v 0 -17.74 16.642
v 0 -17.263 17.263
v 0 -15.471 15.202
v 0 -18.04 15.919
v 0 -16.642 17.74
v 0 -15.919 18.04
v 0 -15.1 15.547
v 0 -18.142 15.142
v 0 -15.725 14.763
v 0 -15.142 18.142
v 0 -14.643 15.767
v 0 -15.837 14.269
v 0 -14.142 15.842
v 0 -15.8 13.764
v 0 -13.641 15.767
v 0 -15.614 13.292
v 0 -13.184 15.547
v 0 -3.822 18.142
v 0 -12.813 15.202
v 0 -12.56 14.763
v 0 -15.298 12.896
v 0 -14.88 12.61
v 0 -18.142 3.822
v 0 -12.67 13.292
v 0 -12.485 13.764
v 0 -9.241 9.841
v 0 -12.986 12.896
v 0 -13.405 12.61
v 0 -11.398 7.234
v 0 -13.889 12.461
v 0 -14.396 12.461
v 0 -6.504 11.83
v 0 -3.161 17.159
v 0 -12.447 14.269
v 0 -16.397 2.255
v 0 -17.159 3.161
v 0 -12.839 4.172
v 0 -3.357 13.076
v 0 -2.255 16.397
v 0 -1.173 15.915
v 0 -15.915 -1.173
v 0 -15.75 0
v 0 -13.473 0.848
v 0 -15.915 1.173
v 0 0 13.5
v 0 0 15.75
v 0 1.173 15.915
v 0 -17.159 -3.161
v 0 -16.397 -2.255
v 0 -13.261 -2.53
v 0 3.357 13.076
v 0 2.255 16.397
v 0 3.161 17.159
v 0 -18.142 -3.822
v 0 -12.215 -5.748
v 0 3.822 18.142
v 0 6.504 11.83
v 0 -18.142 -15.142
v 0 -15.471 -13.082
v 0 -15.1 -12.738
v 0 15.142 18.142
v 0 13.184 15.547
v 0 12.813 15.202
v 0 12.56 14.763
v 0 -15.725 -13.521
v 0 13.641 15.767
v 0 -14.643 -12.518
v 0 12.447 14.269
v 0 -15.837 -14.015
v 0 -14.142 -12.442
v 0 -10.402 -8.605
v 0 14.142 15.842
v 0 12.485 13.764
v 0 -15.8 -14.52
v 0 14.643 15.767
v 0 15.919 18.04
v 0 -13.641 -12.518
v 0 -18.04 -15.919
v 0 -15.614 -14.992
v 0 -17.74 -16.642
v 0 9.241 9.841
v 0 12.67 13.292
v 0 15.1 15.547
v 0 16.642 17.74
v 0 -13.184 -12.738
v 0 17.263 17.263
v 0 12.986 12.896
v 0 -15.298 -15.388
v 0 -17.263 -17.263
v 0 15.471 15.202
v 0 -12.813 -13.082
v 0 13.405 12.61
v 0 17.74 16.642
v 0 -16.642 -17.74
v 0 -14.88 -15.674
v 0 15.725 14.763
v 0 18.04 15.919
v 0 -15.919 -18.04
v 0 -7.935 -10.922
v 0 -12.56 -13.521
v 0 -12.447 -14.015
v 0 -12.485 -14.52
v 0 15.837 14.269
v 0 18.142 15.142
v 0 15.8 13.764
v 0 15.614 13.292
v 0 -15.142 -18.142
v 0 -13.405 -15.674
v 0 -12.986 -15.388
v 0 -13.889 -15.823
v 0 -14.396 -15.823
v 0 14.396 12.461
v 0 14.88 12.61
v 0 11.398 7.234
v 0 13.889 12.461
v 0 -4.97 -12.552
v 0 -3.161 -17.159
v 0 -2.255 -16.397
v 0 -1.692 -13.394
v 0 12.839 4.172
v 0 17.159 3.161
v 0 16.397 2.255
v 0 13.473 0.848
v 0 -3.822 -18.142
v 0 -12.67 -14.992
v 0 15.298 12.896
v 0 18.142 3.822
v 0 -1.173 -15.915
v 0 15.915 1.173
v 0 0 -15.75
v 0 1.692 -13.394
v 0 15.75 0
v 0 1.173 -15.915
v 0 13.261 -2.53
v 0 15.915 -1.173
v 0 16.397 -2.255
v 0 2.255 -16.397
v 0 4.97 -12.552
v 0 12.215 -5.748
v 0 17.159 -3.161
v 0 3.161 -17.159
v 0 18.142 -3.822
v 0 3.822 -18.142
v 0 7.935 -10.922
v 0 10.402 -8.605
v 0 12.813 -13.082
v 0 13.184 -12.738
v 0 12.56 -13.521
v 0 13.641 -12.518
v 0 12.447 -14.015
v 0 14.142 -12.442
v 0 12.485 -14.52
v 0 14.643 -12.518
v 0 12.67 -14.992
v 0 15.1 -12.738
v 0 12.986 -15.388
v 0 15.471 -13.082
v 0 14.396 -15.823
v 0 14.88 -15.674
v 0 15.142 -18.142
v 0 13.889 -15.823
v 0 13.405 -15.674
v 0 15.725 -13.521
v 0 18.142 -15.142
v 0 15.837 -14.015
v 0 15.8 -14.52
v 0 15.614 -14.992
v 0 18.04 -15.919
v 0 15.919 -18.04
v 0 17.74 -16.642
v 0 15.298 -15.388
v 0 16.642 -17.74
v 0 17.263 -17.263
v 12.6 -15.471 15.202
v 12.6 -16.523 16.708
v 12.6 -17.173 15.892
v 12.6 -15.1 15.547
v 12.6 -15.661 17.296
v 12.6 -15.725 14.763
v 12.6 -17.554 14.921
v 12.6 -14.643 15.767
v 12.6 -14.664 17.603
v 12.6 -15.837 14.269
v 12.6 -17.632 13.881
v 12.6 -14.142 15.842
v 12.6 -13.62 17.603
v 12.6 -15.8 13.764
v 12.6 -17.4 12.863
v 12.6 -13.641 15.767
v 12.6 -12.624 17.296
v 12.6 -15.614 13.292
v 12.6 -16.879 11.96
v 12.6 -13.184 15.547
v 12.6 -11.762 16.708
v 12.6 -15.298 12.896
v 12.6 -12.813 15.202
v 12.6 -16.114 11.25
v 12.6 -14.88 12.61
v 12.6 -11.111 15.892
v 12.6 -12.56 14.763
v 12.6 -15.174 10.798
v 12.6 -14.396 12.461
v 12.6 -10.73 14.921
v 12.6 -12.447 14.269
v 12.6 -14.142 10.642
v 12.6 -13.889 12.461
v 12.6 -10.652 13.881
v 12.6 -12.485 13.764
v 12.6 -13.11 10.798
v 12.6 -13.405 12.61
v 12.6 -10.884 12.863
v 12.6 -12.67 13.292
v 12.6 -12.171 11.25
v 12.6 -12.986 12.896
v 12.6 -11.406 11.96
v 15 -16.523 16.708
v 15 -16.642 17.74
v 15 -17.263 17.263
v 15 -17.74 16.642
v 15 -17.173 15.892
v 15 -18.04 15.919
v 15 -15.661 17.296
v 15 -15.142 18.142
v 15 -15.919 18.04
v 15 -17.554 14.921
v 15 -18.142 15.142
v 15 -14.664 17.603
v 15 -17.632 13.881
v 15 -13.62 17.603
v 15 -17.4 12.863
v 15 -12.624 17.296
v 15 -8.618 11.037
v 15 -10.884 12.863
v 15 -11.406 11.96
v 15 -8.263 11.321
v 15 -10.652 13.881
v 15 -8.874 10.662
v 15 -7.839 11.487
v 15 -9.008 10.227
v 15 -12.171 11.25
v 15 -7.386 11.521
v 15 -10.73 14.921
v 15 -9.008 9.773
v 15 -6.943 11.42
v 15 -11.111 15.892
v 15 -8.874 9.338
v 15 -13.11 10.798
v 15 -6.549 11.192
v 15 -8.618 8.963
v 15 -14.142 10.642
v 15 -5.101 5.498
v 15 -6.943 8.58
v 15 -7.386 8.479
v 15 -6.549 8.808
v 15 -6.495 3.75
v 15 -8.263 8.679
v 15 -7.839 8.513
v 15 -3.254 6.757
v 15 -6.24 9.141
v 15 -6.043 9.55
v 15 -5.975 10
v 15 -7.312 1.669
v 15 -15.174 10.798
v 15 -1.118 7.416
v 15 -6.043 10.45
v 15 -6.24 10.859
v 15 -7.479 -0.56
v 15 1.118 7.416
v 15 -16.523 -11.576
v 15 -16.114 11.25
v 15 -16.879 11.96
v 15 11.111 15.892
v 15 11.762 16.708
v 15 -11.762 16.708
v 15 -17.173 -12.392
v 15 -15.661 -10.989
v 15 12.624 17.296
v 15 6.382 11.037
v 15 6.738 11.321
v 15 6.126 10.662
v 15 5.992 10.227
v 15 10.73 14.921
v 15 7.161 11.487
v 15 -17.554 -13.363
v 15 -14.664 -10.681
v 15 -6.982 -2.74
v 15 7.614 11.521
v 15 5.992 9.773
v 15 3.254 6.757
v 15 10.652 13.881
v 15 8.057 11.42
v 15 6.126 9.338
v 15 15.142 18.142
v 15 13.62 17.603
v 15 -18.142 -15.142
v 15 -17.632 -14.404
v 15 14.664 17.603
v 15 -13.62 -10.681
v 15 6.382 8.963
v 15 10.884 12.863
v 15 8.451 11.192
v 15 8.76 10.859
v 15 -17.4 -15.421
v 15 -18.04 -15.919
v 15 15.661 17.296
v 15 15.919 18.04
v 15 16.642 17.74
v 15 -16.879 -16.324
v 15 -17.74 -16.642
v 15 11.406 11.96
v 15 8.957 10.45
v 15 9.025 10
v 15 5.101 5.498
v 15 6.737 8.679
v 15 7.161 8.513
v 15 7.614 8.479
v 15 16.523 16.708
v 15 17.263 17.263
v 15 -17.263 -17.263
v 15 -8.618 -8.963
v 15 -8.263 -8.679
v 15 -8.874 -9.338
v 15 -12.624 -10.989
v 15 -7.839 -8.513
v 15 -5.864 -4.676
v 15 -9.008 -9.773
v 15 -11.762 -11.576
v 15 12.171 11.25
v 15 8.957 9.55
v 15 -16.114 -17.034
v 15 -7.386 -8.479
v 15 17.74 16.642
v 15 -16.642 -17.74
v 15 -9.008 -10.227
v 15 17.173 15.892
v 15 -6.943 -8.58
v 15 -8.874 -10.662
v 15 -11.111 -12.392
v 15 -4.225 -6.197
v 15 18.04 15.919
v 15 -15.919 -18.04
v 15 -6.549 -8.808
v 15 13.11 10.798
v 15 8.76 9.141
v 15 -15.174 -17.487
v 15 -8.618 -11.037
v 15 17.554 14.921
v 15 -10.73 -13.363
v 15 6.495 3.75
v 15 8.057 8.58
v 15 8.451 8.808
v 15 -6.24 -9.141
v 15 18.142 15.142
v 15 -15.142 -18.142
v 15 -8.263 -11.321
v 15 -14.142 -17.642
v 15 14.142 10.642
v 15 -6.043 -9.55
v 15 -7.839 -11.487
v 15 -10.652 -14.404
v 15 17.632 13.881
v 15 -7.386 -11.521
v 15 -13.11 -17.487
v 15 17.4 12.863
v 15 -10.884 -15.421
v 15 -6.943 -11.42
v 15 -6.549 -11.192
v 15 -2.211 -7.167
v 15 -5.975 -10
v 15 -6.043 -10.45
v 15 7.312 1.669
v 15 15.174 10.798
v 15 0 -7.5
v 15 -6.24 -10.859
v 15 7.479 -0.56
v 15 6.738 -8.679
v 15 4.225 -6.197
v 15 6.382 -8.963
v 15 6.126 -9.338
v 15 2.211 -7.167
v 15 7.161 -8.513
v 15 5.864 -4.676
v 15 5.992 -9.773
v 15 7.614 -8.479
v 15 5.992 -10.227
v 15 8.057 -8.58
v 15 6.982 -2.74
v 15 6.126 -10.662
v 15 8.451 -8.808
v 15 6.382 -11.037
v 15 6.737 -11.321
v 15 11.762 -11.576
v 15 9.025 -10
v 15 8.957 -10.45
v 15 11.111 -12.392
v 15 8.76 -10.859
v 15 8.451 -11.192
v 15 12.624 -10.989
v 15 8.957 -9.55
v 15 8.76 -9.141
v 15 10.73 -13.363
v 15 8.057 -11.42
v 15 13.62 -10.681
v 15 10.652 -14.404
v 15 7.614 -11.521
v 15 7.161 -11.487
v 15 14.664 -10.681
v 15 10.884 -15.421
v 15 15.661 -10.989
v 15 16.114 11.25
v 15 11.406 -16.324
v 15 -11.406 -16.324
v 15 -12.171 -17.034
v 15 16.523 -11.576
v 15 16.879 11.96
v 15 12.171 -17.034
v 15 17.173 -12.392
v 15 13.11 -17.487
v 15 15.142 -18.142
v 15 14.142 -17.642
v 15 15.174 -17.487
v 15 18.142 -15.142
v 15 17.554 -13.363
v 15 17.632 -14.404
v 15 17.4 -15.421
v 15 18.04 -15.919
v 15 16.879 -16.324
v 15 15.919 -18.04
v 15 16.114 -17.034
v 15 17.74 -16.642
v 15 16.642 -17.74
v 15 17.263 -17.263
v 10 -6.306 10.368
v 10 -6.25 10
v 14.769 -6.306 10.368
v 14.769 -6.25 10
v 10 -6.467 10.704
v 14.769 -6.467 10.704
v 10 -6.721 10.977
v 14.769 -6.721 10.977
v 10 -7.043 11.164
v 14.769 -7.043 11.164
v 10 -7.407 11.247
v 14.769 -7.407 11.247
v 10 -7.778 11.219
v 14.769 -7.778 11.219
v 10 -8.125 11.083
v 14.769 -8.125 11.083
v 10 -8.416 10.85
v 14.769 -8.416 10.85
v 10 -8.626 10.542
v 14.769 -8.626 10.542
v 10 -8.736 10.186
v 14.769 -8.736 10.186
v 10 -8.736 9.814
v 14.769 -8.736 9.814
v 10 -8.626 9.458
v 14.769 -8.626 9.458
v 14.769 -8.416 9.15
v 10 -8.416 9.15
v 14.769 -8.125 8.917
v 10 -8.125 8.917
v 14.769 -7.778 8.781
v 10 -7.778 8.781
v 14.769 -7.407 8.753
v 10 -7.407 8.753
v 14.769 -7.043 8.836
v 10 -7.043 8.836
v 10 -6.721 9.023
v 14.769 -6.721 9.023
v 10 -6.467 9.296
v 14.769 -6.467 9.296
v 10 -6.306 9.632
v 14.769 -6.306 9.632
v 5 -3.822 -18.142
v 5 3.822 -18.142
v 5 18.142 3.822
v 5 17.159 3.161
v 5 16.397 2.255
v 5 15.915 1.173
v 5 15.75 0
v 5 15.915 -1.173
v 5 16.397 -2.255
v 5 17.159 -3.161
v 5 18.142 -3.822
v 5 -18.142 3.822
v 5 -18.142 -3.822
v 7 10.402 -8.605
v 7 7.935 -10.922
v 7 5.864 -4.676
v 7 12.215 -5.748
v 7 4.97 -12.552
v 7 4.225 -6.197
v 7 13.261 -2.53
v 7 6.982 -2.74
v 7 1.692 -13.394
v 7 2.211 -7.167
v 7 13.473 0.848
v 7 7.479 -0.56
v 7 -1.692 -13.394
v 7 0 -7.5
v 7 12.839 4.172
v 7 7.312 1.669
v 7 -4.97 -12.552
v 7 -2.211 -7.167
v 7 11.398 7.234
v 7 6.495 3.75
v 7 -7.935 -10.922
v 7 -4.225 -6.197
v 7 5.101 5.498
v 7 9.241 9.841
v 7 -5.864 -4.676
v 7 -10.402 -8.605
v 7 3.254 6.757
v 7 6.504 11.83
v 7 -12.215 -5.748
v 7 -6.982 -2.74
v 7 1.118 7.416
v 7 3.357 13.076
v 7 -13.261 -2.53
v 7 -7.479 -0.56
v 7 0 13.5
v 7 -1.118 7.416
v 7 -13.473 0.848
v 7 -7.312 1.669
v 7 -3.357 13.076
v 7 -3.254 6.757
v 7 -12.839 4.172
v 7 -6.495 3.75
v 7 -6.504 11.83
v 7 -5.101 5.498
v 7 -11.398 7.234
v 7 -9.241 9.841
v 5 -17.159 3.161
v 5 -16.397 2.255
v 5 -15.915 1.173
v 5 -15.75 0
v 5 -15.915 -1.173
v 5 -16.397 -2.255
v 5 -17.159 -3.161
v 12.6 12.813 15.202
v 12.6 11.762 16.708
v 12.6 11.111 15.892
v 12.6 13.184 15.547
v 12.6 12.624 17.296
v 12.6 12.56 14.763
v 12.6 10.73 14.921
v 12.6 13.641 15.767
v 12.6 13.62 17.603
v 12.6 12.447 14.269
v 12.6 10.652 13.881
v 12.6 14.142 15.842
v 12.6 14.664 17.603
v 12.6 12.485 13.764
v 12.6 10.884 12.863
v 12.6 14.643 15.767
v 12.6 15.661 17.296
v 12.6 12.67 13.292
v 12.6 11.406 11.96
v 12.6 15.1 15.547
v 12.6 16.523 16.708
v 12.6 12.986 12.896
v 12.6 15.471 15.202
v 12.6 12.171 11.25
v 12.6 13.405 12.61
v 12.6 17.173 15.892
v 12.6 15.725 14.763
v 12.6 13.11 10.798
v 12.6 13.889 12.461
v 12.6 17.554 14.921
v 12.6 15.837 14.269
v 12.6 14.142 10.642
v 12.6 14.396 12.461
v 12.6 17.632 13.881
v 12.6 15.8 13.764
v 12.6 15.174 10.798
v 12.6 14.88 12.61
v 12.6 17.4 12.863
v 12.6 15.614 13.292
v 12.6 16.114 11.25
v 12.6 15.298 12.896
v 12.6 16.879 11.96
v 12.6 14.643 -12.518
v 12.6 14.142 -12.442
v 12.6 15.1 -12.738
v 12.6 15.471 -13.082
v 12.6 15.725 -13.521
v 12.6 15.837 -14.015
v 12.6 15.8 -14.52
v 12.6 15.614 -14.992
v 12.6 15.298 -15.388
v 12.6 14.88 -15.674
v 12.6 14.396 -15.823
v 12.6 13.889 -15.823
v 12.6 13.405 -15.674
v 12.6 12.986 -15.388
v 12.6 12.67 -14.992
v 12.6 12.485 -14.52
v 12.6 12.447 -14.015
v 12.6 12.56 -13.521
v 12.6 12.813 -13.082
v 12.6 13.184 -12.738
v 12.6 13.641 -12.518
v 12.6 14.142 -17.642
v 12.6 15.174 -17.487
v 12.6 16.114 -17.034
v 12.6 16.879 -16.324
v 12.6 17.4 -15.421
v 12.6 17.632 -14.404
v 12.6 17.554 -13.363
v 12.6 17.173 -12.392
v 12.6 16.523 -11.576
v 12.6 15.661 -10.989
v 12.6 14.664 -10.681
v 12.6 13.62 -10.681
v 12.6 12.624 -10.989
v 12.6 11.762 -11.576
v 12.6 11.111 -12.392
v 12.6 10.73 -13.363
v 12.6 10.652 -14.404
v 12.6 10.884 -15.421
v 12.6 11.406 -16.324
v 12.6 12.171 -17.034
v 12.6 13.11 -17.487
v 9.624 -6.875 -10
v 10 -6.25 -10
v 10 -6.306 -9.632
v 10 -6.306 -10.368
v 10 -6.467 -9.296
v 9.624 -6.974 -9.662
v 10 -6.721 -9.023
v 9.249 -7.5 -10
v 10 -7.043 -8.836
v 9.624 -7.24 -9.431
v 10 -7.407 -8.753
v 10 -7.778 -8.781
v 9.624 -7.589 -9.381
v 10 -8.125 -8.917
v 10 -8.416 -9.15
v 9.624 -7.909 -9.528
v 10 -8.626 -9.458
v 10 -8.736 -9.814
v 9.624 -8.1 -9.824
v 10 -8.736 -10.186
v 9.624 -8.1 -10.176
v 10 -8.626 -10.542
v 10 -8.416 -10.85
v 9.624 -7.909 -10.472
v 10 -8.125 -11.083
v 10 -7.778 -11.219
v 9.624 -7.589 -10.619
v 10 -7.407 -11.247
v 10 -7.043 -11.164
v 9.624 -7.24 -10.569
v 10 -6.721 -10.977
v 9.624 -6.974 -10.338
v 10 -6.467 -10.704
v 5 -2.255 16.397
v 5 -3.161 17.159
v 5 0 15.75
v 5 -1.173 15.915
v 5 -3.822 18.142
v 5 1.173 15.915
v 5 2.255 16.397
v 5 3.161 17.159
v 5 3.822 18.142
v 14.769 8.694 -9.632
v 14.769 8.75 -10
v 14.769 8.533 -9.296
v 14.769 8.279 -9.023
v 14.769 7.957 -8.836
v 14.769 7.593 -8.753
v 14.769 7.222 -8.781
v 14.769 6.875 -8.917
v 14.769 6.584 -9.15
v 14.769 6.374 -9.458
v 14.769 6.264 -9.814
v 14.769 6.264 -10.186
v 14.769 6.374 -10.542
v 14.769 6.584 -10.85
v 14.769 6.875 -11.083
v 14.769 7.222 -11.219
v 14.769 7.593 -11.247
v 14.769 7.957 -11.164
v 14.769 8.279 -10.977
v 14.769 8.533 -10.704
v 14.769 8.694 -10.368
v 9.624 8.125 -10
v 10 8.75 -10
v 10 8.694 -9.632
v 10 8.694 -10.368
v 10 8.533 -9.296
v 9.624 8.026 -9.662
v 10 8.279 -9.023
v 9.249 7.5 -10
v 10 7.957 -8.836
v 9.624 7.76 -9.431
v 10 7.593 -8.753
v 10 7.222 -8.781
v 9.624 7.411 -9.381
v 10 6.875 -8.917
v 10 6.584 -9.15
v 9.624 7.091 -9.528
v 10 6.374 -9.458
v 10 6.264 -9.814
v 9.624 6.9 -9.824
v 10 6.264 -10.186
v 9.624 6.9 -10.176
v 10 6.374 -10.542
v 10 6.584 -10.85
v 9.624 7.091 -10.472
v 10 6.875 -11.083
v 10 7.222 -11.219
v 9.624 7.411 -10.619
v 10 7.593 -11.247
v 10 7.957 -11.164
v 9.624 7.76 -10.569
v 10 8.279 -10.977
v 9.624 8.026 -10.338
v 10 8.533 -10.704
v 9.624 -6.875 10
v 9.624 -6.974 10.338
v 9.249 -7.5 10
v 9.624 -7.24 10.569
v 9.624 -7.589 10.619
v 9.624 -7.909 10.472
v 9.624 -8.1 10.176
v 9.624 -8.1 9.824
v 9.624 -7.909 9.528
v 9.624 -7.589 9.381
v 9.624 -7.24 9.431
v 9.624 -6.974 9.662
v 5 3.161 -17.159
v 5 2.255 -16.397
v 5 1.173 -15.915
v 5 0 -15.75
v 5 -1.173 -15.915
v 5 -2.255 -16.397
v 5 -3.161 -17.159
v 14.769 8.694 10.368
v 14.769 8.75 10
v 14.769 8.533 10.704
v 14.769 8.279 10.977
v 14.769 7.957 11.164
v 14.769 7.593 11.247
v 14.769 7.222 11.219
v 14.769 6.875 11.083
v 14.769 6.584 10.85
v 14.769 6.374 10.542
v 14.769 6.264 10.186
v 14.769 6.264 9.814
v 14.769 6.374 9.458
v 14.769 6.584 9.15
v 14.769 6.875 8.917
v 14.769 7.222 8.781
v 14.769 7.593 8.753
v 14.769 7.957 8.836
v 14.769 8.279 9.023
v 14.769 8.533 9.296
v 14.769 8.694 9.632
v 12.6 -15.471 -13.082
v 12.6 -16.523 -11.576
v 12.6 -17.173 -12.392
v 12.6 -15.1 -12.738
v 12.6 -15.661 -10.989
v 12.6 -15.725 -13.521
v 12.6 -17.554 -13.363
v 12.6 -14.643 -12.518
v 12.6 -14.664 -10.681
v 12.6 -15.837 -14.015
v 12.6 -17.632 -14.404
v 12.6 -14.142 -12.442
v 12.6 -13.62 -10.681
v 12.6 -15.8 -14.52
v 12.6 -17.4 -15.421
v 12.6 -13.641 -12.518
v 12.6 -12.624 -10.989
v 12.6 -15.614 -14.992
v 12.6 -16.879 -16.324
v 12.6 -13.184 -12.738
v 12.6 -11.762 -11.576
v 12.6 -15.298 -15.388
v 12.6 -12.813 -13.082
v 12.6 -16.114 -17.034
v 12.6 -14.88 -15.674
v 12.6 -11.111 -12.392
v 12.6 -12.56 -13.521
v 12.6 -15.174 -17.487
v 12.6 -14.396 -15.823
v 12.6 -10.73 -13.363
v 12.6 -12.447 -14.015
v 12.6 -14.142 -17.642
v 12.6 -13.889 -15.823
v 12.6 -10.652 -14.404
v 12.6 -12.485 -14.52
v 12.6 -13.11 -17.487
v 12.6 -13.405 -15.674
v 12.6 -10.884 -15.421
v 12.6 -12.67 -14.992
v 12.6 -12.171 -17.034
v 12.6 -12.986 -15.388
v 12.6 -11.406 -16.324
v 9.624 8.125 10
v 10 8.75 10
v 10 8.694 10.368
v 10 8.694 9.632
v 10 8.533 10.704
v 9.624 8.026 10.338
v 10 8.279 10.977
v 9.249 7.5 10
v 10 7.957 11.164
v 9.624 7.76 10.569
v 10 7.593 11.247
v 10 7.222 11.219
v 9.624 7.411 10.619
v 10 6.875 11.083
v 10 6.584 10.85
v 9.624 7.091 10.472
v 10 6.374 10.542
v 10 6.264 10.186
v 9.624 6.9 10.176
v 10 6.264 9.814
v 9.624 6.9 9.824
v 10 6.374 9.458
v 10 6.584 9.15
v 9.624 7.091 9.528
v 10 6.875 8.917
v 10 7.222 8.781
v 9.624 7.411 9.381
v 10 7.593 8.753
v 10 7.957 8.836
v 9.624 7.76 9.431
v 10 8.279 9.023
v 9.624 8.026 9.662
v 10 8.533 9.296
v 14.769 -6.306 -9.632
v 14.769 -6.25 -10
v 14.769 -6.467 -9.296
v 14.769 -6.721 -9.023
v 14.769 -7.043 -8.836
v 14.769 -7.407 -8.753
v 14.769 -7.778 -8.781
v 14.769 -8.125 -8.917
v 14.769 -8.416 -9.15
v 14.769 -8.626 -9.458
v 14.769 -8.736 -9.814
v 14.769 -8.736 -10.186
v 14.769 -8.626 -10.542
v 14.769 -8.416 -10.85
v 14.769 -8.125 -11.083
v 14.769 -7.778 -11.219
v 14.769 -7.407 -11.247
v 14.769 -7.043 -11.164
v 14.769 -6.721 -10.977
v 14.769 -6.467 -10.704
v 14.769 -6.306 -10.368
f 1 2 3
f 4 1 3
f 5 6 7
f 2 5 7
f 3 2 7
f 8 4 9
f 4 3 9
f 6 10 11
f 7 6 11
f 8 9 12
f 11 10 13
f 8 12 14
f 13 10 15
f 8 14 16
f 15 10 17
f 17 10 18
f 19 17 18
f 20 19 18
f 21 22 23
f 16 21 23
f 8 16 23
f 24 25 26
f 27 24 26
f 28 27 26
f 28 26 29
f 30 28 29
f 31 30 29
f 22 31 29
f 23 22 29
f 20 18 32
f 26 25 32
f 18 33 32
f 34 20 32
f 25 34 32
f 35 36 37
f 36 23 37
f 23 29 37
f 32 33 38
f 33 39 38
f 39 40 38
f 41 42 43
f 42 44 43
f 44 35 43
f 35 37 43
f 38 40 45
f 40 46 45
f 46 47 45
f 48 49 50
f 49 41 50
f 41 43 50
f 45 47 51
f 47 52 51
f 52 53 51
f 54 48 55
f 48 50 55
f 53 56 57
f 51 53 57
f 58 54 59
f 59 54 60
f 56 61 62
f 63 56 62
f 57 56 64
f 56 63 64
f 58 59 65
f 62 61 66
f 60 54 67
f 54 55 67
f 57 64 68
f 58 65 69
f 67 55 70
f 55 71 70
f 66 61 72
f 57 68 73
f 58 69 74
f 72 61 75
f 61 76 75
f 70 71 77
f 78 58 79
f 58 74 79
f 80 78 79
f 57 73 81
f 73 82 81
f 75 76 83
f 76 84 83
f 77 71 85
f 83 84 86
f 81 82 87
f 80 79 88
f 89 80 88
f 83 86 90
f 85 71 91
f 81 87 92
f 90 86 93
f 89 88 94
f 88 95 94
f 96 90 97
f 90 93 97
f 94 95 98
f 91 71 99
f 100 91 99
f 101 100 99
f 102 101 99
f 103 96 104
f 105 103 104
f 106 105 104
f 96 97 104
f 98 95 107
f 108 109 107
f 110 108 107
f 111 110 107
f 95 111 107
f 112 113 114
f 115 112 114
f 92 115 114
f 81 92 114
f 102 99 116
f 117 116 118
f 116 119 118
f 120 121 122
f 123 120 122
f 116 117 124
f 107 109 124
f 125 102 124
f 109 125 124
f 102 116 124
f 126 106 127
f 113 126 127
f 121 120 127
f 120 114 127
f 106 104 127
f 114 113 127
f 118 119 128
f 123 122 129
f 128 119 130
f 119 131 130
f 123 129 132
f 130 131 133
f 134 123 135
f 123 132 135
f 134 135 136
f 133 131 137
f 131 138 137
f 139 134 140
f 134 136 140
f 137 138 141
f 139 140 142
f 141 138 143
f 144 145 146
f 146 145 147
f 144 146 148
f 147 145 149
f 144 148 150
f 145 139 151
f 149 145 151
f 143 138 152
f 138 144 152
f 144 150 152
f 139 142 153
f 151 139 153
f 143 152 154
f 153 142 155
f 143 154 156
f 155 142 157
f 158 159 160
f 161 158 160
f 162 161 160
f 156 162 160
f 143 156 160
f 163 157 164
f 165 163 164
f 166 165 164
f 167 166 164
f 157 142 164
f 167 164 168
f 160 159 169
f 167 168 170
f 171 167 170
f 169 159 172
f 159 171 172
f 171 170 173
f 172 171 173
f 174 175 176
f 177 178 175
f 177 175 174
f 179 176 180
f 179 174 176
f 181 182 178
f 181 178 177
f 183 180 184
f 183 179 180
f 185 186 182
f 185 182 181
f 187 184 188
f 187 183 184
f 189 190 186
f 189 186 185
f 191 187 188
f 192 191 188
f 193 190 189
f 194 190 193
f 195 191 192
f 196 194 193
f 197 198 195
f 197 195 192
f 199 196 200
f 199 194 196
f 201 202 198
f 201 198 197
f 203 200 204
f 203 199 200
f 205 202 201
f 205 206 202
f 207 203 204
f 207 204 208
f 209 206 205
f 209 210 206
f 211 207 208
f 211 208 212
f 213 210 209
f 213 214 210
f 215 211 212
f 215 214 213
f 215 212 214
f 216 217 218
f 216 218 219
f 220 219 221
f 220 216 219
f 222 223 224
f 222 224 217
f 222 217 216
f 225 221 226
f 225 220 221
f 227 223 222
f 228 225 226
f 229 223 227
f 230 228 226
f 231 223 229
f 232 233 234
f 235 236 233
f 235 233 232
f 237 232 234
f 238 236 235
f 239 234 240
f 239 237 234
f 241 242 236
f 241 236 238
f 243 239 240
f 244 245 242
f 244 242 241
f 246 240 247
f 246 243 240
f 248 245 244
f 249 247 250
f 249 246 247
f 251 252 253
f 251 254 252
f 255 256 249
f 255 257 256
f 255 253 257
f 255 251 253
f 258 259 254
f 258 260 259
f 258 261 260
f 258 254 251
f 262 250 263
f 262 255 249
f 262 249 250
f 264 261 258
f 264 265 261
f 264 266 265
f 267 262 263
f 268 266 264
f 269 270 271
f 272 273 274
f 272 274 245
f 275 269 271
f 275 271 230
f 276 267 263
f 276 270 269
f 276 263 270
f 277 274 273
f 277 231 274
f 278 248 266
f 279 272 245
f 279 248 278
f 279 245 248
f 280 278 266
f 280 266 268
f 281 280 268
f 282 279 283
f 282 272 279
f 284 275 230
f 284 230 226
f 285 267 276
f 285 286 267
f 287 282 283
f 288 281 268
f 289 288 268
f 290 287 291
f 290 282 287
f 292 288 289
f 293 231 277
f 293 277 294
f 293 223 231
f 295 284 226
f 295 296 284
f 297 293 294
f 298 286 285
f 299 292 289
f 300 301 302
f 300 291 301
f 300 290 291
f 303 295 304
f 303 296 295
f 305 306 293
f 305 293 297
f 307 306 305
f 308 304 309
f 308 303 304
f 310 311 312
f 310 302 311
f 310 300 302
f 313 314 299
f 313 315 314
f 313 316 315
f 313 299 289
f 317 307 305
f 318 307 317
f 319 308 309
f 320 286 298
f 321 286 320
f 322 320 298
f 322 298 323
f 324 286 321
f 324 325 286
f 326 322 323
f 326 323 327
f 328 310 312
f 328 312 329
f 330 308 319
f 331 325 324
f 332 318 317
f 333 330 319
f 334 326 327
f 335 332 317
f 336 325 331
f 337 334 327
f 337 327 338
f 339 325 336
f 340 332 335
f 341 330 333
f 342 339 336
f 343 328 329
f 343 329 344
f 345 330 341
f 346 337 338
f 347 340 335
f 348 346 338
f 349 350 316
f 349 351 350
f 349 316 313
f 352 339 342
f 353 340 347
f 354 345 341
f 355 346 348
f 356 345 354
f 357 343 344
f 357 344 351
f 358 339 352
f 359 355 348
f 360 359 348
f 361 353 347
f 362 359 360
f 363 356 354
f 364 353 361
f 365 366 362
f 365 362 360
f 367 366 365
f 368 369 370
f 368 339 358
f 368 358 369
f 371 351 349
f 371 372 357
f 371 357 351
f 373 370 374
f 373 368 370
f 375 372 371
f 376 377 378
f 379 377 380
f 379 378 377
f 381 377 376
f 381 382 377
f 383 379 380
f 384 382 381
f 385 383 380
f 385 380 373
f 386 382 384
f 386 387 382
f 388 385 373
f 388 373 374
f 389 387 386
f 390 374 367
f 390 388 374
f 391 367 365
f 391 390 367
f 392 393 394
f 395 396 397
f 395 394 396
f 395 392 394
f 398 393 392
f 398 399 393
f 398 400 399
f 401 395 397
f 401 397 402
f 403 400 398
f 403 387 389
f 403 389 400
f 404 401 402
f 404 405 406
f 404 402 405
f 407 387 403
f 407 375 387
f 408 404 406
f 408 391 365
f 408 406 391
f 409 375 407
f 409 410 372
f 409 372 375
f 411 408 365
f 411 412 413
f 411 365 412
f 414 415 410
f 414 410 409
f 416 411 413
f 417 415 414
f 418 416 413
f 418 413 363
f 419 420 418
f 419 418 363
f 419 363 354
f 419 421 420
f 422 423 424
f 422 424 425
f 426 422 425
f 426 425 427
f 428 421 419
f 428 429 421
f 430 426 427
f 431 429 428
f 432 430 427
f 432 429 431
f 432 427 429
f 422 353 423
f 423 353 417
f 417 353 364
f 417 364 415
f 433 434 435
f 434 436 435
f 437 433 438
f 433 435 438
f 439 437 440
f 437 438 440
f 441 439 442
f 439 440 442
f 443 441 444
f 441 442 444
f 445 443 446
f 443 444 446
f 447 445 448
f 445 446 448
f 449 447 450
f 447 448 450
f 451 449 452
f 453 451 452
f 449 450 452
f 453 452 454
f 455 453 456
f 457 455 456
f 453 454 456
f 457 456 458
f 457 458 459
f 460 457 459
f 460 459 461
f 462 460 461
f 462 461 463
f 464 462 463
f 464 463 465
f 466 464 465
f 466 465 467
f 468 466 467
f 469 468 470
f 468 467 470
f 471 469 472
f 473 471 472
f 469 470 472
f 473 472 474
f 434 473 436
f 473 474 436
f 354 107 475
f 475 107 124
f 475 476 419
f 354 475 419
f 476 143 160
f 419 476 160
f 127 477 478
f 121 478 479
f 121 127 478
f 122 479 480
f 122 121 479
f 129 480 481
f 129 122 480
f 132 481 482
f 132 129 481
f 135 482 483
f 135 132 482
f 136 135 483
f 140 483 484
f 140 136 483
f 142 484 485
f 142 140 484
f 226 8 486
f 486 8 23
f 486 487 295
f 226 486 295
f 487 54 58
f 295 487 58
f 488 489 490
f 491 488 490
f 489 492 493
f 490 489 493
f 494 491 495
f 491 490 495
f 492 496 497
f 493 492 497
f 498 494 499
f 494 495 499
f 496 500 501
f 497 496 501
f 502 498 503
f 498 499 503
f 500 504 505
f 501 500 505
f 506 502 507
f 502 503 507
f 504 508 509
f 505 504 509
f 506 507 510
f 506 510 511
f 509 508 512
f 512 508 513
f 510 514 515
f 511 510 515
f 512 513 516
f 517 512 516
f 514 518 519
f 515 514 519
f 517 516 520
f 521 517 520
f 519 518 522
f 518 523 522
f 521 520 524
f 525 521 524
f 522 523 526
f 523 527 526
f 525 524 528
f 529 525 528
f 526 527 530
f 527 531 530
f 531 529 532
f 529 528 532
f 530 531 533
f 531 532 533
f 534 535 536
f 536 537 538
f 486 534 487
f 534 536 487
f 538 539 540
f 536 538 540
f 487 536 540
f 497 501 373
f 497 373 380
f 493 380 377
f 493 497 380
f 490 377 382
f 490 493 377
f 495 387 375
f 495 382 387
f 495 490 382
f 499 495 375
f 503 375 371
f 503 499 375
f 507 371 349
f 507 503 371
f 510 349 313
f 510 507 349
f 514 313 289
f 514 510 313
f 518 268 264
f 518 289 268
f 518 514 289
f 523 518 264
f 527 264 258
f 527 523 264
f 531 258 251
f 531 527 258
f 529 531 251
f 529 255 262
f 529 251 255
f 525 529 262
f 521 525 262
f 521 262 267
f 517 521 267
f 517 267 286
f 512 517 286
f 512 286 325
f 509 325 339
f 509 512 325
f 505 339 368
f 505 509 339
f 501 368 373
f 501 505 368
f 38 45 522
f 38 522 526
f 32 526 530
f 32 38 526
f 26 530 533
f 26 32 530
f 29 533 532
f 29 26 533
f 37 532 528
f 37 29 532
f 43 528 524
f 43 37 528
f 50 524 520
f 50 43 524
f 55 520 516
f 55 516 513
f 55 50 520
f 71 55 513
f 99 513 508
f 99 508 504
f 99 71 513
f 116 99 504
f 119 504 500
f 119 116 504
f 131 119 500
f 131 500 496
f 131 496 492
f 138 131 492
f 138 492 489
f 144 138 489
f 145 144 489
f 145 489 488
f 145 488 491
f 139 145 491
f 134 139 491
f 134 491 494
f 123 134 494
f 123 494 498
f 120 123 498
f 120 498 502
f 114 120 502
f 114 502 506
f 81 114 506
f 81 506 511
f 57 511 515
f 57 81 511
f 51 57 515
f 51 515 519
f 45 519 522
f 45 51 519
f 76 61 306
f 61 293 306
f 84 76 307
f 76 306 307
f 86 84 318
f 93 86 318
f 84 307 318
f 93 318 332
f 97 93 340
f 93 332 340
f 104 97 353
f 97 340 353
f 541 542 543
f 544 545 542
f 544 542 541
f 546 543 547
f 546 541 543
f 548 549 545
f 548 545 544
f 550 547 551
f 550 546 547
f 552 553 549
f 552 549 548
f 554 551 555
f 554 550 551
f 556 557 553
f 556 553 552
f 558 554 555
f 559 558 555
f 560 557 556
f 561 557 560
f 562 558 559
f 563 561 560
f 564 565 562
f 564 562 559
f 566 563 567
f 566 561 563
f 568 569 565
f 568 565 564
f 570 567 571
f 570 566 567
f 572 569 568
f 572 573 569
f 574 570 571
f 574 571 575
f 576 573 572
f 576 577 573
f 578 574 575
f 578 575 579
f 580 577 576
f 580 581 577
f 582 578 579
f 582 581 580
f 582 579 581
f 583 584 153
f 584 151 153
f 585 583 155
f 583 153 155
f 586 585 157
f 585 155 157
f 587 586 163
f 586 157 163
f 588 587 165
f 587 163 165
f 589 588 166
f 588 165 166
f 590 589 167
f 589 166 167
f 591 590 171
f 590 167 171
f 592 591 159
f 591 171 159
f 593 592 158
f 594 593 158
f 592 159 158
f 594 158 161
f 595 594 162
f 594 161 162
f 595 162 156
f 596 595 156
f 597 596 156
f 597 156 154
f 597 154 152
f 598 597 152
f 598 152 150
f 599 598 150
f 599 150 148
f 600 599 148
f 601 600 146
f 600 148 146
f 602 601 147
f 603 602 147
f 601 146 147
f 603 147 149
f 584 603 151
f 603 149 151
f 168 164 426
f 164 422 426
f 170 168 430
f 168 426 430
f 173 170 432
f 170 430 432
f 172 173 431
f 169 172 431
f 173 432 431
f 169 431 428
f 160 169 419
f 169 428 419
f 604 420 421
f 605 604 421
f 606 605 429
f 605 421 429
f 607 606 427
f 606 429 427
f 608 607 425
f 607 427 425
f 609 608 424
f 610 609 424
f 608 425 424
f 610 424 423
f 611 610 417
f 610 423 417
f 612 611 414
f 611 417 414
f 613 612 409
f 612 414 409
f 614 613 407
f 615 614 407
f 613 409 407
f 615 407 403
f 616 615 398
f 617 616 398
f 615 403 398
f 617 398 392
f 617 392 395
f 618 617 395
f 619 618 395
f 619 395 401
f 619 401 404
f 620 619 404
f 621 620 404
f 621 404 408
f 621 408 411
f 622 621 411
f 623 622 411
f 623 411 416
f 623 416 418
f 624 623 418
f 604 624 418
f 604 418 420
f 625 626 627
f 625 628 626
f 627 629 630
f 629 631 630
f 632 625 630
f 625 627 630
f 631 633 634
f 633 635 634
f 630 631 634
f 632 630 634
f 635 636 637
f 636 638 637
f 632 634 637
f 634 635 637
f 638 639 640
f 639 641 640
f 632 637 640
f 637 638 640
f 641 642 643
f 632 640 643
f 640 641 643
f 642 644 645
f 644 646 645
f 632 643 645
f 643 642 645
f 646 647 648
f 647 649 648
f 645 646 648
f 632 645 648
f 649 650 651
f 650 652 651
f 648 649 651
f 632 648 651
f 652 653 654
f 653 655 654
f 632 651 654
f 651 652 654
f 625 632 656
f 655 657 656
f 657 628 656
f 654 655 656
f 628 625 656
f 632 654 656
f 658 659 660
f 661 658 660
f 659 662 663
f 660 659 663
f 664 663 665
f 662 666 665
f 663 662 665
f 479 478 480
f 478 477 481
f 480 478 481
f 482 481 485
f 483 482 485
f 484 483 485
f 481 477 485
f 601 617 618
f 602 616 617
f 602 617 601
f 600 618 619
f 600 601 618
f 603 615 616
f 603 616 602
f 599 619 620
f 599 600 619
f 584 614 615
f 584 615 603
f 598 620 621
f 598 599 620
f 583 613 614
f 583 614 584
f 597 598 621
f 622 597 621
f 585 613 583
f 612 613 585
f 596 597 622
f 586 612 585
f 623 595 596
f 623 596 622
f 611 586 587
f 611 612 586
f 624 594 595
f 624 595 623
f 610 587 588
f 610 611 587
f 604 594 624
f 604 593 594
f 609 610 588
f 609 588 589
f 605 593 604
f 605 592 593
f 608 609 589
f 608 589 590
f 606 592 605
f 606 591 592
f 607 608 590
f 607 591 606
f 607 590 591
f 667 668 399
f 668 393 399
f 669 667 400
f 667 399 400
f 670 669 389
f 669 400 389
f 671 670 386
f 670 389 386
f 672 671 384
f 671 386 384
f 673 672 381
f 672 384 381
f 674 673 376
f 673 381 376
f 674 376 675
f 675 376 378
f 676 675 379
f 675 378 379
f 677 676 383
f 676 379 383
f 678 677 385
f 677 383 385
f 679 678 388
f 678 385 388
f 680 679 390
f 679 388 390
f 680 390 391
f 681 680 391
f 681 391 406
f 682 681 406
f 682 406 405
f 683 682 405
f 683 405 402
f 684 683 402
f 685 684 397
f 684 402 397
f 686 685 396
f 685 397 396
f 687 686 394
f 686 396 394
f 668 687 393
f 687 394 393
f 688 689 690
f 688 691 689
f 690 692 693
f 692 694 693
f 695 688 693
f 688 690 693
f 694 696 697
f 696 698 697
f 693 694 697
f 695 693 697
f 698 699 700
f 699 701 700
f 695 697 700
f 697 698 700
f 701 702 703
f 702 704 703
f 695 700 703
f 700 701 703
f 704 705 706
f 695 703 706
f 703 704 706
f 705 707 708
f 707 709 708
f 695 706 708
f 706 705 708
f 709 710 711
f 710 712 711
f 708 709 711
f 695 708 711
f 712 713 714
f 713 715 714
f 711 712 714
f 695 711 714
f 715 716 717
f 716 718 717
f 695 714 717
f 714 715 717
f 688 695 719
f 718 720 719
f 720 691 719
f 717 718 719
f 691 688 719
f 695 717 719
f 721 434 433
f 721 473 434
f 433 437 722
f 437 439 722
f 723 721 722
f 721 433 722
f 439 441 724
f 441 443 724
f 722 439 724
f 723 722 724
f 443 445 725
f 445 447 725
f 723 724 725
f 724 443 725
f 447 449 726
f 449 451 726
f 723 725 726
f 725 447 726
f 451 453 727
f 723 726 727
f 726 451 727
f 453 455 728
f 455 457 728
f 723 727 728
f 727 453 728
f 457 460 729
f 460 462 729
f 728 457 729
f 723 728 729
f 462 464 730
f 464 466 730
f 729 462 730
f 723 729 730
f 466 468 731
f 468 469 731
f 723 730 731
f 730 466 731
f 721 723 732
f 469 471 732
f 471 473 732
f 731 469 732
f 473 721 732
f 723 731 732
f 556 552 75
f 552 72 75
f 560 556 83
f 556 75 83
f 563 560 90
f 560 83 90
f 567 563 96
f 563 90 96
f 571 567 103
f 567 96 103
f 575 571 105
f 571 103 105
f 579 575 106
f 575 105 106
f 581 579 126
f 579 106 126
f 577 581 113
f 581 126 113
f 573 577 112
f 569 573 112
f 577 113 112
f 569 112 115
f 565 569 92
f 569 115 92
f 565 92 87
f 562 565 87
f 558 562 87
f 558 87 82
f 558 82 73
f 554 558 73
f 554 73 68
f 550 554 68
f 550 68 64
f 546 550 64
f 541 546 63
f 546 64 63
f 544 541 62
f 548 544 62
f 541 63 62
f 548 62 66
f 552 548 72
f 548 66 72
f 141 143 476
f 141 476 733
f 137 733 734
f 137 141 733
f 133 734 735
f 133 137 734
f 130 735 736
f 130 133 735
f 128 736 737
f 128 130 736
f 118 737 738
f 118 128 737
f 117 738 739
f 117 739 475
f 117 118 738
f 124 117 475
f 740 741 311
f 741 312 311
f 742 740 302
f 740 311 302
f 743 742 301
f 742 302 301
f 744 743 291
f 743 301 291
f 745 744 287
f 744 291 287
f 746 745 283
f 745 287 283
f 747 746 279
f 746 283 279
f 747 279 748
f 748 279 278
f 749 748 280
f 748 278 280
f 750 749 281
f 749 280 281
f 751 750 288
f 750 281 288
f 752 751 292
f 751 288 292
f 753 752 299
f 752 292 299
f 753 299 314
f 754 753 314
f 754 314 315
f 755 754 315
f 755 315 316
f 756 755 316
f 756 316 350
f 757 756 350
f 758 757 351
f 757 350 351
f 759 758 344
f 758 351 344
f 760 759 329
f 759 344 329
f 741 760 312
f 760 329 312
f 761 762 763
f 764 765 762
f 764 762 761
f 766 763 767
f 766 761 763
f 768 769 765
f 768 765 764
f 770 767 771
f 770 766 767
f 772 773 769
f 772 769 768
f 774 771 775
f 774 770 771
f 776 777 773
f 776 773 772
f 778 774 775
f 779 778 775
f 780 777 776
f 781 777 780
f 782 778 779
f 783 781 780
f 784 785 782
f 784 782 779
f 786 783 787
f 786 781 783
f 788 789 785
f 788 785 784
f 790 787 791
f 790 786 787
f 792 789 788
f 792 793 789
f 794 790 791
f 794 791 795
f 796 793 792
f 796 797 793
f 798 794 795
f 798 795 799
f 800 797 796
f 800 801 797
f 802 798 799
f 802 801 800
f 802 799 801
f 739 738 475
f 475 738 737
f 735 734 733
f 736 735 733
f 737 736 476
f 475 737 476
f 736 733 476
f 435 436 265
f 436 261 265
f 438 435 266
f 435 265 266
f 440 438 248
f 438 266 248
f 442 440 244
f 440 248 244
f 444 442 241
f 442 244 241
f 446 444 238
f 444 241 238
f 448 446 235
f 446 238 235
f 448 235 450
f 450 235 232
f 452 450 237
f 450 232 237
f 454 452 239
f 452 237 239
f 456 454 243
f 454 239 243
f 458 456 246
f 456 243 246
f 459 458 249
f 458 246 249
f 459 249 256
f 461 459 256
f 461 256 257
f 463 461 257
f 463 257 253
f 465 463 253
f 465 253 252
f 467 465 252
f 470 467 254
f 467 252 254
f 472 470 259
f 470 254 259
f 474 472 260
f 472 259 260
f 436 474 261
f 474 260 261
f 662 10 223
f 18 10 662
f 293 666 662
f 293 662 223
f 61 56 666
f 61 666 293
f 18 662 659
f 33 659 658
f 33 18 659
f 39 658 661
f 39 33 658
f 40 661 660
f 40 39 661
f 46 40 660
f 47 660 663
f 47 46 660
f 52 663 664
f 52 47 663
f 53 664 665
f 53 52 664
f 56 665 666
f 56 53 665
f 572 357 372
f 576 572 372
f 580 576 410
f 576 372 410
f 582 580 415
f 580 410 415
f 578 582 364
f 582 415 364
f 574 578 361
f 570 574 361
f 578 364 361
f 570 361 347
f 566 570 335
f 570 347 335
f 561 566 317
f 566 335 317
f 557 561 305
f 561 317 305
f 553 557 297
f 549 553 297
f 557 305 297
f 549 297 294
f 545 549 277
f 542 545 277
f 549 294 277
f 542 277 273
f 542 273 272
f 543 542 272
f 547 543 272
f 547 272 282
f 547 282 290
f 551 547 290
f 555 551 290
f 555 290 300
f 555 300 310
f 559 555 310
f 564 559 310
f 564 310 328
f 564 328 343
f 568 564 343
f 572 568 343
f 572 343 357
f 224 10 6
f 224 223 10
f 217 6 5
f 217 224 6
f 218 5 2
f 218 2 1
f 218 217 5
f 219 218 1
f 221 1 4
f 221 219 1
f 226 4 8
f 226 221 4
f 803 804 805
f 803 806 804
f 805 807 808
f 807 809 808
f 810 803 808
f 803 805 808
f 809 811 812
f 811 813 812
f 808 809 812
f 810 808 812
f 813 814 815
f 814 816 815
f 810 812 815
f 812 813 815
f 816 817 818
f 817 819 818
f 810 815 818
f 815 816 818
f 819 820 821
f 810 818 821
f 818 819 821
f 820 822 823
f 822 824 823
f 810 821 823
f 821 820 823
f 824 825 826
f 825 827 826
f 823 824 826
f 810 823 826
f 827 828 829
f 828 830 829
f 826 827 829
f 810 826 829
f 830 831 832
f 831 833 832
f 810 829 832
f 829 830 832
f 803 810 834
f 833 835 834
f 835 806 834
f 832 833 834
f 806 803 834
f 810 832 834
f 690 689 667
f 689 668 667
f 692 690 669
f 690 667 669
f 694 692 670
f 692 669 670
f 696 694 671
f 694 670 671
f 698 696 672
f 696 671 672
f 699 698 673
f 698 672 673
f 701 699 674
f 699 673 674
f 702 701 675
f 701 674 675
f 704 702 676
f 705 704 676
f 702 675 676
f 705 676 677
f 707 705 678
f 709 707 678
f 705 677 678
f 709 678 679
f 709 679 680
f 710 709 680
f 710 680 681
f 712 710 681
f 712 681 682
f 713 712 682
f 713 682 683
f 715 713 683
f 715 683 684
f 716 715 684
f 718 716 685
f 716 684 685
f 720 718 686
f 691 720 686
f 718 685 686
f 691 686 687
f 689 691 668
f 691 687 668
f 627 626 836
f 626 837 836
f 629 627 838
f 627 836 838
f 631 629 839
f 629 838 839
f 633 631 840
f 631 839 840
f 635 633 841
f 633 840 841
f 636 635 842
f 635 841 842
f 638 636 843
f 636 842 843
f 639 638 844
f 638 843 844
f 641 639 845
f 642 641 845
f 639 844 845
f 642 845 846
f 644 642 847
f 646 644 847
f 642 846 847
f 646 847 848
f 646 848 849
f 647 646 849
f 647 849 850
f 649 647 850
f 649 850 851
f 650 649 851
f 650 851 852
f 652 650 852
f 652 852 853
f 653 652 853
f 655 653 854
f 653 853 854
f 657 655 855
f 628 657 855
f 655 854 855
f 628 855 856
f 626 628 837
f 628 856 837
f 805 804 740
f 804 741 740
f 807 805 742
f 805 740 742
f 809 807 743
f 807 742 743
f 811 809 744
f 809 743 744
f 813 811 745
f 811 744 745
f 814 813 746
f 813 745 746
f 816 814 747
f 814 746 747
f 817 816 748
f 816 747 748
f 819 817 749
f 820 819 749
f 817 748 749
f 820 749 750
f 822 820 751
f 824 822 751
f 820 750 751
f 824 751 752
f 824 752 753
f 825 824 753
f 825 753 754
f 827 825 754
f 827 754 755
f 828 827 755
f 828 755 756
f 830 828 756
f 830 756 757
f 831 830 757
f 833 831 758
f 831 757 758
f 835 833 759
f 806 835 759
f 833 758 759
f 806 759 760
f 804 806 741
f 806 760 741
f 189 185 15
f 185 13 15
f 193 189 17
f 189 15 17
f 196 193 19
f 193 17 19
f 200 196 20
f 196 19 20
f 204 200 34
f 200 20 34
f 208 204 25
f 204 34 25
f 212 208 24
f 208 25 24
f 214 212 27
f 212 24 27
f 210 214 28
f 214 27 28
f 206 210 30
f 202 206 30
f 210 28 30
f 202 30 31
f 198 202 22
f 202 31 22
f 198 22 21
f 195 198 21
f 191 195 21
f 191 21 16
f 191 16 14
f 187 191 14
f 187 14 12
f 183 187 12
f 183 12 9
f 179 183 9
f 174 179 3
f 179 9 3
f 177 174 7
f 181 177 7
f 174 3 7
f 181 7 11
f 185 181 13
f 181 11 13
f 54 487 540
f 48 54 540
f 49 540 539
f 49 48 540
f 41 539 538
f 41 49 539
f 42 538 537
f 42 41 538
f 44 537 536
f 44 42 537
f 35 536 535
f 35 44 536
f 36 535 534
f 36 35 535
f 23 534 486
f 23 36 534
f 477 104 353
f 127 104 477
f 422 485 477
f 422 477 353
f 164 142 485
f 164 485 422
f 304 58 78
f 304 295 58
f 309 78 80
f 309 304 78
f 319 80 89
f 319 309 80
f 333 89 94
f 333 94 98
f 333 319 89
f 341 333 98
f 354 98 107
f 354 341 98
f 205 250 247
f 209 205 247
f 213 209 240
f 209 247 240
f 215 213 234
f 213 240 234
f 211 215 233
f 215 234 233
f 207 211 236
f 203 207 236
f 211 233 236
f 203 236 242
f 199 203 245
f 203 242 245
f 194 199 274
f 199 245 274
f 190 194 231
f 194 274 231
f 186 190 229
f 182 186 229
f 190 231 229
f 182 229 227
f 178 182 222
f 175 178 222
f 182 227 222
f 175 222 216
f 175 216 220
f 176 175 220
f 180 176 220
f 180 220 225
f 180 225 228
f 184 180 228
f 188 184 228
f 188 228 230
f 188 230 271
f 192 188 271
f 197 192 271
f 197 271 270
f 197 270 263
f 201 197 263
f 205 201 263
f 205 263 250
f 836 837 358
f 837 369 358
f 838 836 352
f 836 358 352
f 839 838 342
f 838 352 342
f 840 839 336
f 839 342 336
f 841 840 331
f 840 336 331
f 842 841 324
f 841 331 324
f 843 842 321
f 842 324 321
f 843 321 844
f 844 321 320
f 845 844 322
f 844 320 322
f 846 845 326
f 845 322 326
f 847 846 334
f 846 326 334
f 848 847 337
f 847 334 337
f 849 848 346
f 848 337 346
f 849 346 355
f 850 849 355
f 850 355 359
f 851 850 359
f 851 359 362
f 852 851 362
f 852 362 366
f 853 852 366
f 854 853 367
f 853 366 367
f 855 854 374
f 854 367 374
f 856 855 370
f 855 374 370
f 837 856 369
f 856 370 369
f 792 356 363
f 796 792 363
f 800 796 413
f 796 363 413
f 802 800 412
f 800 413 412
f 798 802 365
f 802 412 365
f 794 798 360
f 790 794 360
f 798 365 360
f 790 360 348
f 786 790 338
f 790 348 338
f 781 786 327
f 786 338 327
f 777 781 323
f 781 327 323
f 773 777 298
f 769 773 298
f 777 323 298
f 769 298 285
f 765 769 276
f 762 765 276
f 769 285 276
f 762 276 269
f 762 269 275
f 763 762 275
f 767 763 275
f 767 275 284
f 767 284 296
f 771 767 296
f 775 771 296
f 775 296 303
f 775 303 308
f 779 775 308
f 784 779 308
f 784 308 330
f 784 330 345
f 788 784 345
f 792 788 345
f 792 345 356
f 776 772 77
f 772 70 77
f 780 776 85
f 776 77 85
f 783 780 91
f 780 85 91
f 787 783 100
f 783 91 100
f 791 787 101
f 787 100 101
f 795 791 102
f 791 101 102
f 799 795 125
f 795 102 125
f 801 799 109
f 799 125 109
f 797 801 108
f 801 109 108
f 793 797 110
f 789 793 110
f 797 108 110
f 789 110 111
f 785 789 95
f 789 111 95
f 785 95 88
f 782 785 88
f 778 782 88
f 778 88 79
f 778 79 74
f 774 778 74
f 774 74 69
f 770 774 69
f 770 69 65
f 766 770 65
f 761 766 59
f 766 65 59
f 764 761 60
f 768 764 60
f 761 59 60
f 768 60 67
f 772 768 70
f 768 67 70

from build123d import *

# Parameters (mm, degrees)
SKETCH1_W                                        = 36.284271248
SKETCH1_H                                        = 36.284271248
BOSS_EXTRUDE1_DEPTH                              = 15
CUT_EXTRUDE1_DEPTH                               = 7
CUT_EXTRUDE1_DEPTH_BACK                          = 30.719928835
SKETCH1_4_R                                      = 13.5
SKETCH1_4_R_2                                    = 7.5
CUT_EXTRUDE2_DEPTH                               = 30.719928835
CUT_EXTRUDE2_DEPTH_BACK                          = 30.719928835
SKETCH1_5_R                                      = 7.5
FILLET1_R                                        = 3
CBORE_FOR_M3_PAN_HEAD_MACHINE_SCREW1_D           = 3.4
CBORE_FOR_M3_PAN_HEAD_MACHINE_SCREW1_CBORE_D     = 7
CBORE_FOR_M3_PAN_HEAD_MACHINE_SCREW1_CBORE_DEPTH = 2.4
SKETCH1_6_R                                      = 4.25
CUT_EXTRUDE3_DEPTH                               = 5


# Read off the part's stored shape, not the designer's step: M3x0.5 Tapped Hole1
with BuildPart() as part:
    # Sketch1 → Boss-Extrude1 (new body)
    with BuildSketch(Plane(origin=(0, 0, 0), x_dir=(0, 0, -1), z_dir=(1, 0, 0))):
        Rectangle(SKETCH1_W, SKETCH1_H)
    extrude(amount=BOSS_EXTRUDE1_DEPTH)

    # Sketch1<4> → Cut-Extrude1 (cut, two sides: drawn at the far end of the back side and taken through both)
    with BuildSketch(Plane(origin=(0, 0, 0), x_dir=(0, 0, -1), z_dir=(1, 0, 0)).offset(-CUT_EXTRUDE1_DEPTH_BACK)):
        with Locations(Location((0, 0, 0), (0, 0, 180))):
            Circle(SKETCH1_4_R)
        with Locations(Location((0, 0, 0), (0, 0, 180))):
            Circle(SKETCH1_4_R_2, mode=Mode.SUBTRACT)
    extrude(amount=CUT_EXTRUDE1_DEPTH + CUT_EXTRUDE1_DEPTH_BACK, mode=Mode.SUBTRACT)

    # Sketch1<5> → Cut-Extrude2 (cut, two sides: drawn at the far end of the back side and taken through both)
    with BuildSketch(Plane(origin=(0, 0, 0), x_dir=(0, 0, -1), z_dir=(1, 0, 0)).offset(-CUT_EXTRUDE2_DEPTH_BACK)):
        Circle(SKETCH1_5_R)
    extrude(amount=CUT_EXTRUDE2_DEPTH + CUT_EXTRUDE2_DEPTH_BACK, mode=Mode.SUBTRACT)

    # M3x0.5 Tapped Hole1 outline → M3x0.5 Tapped Hole1 (revolve, cut)
    with BuildSketch(Plane(origin=(0, -7.5, -10), x_dir=(0, 1, 0), z_dir=(0, 0, -1))):
        Polygon((0, 15), (0, 9.248924226), (1.25, 10), (1.25, 14.769247601), (1.525, 15), align=None)
    revolve(axis=Axis((0, -7.5, -10), (1, 0, 0)), mode=Mode.SUBTRACT)

    # M3x0.5 Tapped Hole1 2 outline → M3x0.5 Tapped Hole1 2 (revolve, cut)
    with BuildSketch(Plane(origin=(0, 7.5, 10), x_dir=(0, 1, 0), z_dir=(0, 0, -1))):
        Polygon((0, 15), (0, 9.248924226), (1.25, 10), (1.25, 14.769247601), (1.525, 15), align=None)
    revolve(axis=Axis((0, 7.5, 10), (1, 0, 0)), mode=Mode.SUBTRACT)

    # M3x0.5 Tapped Hole1 3 outline → M3x0.5 Tapped Hole1 3 (revolve, cut)
    with BuildSketch(Plane(origin=(0, -7.5, 10), x_dir=(0, 1, 0), z_dir=(0, 0, -1))):
        Polygon((0, 15), (0, 9.248924226), (1.25, 10), (1.25, 14.769247601), (1.525, 15), align=None)
    revolve(axis=Axis((0, -7.5, 10), (1, 0, 0)), mode=Mode.SUBTRACT)

    # M3x0.5 Tapped Hole1 4 outline → M3x0.5 Tapped Hole1 4 (revolve, cut)
    with BuildSketch(Plane(origin=(0, 7.5, -10), x_dir=(0, 1, 0), z_dir=(0, 0, -1))):
        Polygon((0, 15), (0, 9.248924226), (1.25, 10), (1.25, 14.769247601), (1.525, 15), align=None)
    revolve(axis=Axis((0, 7.5, -10), (1, 0, 0)), mode=Mode.SUBTRACT)

    # Fillet1
    fillet1_edges = [part.edges().sort_by_distance(p)[0] for p in [
        (7.5, -18.142135624, 18.142135624),
        (7.5, -18.142135624, -18.142135624),
        (7.5, 18.142135624, -18.142135624),
        (7.5, 18.142135624, 18.142135624),
    ]]
    fillet(fillet1_edges, radius=FILLET1_R)

    # CBORE for M3 Pan Head Machine Screw1 (through all)
    with Locations(Plane(origin=(15, 0, 0), x_dir=(0, 0, -1), z_dir=(1, 0, 0))):
        with Locations((14.142135624, 14.142135624), (-14.142135624, 14.142135624), (-14.142135624, -14.142135624), (14.142135624, -14.142135624)):
            CounterBoreHole(CBORE_FOR_M3_PAN_HEAD_MACHINE_SCREW1_D / 2, CBORE_FOR_M3_PAN_HEAD_MACHINE_SCREW1_CBORE_D / 2, CBORE_FOR_M3_PAN_HEAD_MACHINE_SCREW1_CBORE_DEPTH)

    # Sketch1<6> → Cut-Extrude3 (cut)
    with BuildSketch(Plane(origin=(0, 0, 0), x_dir=(0, 0, -1), z_dir=(1, 0, 0))):
        with Locations((0, 20)):
            Circle(SKETCH1_6_R)
        with Locations((0, -20)):
            Circle(SKETCH1_6_R)
        with Locations((20, 0)):
            Circle(SKETCH1_6_R)
        with Locations((-20, 0)):
            Circle(SKETCH1_6_R)
    extrude(amount=CUT_EXTRUDE3_DEPTH, mode=Mode.SUBTRACT)


solid = part.part
